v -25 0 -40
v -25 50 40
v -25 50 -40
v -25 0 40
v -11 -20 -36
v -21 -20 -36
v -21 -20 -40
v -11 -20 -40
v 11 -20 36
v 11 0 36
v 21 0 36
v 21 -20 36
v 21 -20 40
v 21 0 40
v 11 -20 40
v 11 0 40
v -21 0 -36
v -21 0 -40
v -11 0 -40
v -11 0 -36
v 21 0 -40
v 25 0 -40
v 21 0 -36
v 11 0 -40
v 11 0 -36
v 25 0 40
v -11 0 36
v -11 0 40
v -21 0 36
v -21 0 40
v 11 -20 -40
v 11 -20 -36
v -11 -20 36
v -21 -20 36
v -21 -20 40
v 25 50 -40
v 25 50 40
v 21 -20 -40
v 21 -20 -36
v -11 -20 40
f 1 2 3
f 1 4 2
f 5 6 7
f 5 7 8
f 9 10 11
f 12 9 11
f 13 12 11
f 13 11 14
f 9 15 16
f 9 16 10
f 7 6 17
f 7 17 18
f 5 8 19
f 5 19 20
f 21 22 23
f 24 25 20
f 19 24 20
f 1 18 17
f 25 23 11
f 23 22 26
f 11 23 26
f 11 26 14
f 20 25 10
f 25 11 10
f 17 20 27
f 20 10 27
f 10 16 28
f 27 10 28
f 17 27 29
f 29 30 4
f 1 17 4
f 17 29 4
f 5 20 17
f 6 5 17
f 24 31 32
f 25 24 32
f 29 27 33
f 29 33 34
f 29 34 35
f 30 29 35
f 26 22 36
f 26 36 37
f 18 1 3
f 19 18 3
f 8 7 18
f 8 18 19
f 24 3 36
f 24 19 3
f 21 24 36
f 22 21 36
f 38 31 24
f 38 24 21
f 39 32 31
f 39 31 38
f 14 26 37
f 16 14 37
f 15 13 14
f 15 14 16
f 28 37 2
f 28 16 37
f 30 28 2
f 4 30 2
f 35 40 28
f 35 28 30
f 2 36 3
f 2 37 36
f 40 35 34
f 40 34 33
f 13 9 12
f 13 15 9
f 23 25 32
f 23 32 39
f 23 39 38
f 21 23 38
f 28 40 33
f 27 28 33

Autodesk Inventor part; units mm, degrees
ref_plane "YZ Plane" through (0, 0, 0) normal (1, 0, 0) x (0, 1, 0)
ref_plane "XZ Plane" through (0, 0, 0) normal (0, 1, 0) x (-1, 0, 0)
ref_plane "XY Plane" through (0, 0, 0) normal (0, 0, 1) x (1, 0, 0)
sketch "Boceto1" plane through (0, 0, 0) normal (0, 1, 0) x (-1, 0, 0)
  line L0 (-25, 40) -> (25, 40)
  line L1 (25, 40) -> (25, -40)
  line L2 (25, -40) -> (-25, -40)
  line L3 (-25, -40) -> (-25, 40)
  line L4 (-25, 40) -> (25, -40) construction
  line L5 (25, 40) -> (-25, -40) construction
  point P0 (0, 0)
  dimension "d0" = 50
  dimension "d1" = 80
extrude "Extrusión1" add sketch "Boceto1" along normal blind 50
sketch "Boceto2" plane through (0, 0, 0) normal (0, -1, 0) x (1, 0, 0)
  line L0 (-25, 40) -> (25, 40) projected
  line L1 (21, 40) -> (11, 40)
  line L2 (11, 40) -> (11, 36)
  line L3 (11, 36) -> (21, 36)
  line L4 (21, 36) -> (21, 40)
  line L5 (-25, -40) -> (25, -40)
  line L6 (21, -40) -> (11, -40)
  line L7 (11, -40) -> (11, -36)
  line L8 (11, -36) -> (21, -36)
  line L9 (21, -36) -> (21, -40)
  line L10 (25, 40) -> (-25, 40)
  line L11 (-11, 40) -> (-11, 36)
  line L12 (-11, 36) -> (-21, 36)
  line L13 (-21, 36) -> (-21, 40)
  line L14 (-21, -36) -> (-21, -40)
  line L15 (-11, -40) -> (-11, -36)
  line L16 (-11, -36) -> (-21, -36)
  line L17 (25, -40) -> (-25, -40)
  point P0 (0, 0)
  dimension "d6" = 4
extrude "Extrusión2" add sketch "Boceto2" along normal blind 20
properties part number "Caja"
